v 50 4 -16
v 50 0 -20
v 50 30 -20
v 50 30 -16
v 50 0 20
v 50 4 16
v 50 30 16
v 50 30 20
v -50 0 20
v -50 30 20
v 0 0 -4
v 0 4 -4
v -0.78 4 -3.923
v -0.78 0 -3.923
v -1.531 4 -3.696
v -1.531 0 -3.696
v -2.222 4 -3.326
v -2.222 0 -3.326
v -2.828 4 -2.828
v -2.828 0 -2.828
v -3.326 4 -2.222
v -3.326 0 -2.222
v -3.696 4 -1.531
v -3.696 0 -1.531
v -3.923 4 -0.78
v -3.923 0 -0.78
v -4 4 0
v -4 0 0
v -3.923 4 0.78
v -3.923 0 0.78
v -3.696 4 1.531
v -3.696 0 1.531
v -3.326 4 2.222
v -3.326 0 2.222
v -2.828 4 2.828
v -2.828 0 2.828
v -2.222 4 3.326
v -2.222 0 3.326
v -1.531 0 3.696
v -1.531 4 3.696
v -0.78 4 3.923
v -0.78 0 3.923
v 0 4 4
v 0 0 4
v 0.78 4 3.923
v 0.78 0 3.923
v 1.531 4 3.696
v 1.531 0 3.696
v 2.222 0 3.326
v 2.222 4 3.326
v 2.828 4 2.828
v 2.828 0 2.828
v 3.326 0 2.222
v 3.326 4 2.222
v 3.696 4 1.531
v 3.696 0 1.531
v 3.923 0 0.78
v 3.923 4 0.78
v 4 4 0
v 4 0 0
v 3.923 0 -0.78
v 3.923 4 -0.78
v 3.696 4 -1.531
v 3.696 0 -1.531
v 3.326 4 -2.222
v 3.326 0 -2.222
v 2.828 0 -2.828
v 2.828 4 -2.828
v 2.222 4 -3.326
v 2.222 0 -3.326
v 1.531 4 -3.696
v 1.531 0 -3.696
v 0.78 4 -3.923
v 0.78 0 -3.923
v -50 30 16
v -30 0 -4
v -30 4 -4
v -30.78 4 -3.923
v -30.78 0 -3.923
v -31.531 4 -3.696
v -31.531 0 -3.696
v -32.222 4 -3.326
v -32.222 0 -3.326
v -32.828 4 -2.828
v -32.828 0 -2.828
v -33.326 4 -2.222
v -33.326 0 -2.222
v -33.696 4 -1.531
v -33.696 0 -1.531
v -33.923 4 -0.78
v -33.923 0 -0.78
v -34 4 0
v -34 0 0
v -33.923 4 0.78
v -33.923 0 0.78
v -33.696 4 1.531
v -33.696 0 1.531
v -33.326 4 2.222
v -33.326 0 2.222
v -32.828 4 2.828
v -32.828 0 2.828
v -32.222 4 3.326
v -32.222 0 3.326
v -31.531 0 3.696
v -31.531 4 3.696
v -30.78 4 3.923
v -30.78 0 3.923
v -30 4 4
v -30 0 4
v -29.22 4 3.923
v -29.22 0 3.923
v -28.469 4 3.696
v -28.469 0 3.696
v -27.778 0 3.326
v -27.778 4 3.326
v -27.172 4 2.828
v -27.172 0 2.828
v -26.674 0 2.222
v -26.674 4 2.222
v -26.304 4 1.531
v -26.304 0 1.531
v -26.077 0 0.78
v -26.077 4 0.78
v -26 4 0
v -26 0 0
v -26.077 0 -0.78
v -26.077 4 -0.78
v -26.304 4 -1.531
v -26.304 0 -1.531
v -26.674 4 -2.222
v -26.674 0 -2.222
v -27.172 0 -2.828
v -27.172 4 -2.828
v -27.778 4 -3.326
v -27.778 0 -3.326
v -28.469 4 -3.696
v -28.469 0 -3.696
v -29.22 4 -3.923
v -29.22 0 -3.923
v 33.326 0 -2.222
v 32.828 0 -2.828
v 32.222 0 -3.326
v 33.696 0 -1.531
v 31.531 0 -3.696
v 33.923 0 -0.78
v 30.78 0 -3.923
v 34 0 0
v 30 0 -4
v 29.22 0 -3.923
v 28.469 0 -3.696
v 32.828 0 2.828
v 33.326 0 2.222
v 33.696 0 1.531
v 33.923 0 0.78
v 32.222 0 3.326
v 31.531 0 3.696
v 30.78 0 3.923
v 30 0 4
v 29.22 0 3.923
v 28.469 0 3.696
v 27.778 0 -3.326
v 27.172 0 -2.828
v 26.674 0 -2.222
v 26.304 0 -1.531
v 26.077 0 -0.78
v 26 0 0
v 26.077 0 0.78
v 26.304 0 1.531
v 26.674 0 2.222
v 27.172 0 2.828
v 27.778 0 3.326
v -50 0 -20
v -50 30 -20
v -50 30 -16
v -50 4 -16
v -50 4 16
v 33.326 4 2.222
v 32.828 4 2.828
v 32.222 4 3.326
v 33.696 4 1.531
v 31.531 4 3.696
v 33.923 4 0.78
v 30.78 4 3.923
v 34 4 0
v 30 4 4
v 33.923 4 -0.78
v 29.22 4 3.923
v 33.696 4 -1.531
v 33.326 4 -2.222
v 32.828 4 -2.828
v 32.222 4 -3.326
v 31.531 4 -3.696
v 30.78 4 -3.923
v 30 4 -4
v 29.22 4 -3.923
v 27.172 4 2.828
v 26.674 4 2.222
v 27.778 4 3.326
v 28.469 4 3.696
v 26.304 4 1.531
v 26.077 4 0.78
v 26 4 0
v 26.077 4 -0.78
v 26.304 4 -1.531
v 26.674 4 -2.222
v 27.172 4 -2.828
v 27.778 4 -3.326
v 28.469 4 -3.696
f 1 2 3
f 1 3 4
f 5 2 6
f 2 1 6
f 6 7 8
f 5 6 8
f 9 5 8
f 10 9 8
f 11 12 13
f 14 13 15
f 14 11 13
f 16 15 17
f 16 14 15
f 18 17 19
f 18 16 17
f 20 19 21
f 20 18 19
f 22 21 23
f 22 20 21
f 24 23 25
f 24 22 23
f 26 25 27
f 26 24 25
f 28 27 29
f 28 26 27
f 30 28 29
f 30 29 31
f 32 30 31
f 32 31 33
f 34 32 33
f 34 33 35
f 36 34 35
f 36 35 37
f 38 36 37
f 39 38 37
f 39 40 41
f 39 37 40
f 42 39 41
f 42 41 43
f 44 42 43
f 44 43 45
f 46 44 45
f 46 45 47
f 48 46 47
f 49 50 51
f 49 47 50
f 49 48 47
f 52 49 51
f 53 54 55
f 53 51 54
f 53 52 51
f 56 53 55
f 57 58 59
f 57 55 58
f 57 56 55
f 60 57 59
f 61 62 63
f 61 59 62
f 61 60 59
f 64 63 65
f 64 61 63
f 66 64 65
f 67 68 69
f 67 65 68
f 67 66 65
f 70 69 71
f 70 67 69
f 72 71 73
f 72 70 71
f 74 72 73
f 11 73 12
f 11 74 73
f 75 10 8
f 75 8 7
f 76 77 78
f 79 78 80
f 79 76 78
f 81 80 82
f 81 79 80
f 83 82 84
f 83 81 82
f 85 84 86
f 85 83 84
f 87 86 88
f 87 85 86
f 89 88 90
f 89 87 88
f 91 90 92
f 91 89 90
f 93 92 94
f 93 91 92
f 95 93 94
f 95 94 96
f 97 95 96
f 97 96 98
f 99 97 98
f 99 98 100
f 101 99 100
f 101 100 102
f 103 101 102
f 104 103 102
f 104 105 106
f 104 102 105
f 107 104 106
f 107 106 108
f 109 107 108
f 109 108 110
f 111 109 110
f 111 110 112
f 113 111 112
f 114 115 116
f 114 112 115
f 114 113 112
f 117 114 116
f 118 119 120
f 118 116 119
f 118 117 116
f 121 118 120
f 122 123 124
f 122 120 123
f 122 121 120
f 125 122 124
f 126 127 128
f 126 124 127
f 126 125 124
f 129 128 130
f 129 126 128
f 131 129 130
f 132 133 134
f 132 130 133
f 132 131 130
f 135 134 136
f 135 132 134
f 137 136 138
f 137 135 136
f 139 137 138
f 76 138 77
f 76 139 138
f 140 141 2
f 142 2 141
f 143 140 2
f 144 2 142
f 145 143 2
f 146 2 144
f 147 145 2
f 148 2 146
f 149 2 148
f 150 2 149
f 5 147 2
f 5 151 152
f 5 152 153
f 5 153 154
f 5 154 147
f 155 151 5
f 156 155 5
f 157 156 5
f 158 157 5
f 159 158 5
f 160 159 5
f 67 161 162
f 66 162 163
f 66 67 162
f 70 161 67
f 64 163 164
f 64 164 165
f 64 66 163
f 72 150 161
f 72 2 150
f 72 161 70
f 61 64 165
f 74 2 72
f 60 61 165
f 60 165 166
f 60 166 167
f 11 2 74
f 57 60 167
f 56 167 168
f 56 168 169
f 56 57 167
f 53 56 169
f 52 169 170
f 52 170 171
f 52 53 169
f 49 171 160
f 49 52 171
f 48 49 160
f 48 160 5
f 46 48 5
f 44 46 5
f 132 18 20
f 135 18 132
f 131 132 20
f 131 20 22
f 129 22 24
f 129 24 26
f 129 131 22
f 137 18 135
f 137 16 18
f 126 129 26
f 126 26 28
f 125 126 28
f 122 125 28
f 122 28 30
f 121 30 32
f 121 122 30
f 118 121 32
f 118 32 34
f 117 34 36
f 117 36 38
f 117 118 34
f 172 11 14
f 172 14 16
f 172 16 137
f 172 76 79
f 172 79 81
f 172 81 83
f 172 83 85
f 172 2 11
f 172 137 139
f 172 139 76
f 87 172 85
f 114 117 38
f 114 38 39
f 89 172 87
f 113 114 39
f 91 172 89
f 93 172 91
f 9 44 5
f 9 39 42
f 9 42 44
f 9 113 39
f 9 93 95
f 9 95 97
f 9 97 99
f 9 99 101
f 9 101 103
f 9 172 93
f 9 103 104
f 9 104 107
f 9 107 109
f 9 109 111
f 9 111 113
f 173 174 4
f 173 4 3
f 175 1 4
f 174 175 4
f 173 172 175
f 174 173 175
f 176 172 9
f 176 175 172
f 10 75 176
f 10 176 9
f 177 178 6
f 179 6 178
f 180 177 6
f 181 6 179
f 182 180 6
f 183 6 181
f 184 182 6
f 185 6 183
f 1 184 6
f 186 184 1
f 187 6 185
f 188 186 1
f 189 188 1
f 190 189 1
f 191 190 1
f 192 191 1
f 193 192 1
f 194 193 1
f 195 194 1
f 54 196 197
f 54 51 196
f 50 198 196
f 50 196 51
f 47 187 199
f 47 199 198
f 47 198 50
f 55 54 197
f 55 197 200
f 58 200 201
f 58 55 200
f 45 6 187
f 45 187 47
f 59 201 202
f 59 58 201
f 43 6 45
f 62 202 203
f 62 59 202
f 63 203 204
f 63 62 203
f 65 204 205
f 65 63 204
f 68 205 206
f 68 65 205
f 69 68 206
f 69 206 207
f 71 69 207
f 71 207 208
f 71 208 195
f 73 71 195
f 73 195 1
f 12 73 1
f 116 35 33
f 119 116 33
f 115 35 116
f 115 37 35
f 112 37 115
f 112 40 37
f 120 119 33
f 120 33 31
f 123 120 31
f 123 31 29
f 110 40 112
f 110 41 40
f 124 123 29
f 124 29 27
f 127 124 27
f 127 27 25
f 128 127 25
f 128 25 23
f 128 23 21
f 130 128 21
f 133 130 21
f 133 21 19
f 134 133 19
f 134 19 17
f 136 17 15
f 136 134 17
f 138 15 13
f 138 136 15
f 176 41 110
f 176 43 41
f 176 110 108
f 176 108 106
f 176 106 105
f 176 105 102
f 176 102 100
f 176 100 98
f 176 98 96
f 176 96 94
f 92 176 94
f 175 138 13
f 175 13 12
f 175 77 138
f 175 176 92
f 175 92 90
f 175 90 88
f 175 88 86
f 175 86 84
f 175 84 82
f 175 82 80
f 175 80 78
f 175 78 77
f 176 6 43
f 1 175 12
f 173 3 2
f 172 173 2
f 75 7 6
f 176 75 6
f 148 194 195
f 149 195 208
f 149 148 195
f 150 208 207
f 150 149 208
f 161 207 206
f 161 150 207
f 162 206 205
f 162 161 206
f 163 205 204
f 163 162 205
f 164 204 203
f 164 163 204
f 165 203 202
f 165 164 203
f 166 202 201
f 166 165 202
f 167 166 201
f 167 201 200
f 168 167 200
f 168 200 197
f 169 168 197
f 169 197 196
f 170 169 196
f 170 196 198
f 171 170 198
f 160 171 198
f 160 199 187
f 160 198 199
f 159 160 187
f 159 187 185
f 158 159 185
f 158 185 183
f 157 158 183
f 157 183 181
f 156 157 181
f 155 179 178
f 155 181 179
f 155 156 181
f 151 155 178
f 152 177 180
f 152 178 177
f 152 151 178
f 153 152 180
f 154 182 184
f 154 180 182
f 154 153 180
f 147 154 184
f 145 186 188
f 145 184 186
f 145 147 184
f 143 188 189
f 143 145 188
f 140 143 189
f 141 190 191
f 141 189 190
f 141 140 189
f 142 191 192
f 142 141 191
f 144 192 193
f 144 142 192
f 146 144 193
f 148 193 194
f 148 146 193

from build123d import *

# Parameters (mm, degrees)
EXTRUDE_1_DEPTH     = 100
SKETCH_2_R          = 4
CUT_EXTRUDE_1_DEPTH = 62.64414003


with BuildPart() as part:
    # 草图1 → 凸台-拉伸1 (new body)
    with BuildSketch(Plane(origin=(-50, 0, 0), x_dir=(0, 0, -1), z_dir=(1, 0, 0))):
        Polygon((20, 0), (-20, 0), (-20, 30), (-16, 30), (-16, 4), (16, 4), (16, 30), (20, 30), align=None)
    extrude(amount=EXTRUDE_1_DEPTH)

    # 草图2 → 切除-拉伸1 (cut, through all)
    with BuildSketch(Plane(origin=(0, 0, 0), x_dir=(1, 0, 0), z_dir=(0, 1, 0))):
        with Locations(Location((-30, 0, 0), (0, 0, 90))):
            Circle(SKETCH_2_R)
        with Locations(Location((0, 0, 0), (0, 0, 90))):
            Circle(SKETCH_2_R)
        with Locations(Location((30, 0, 0), (0, 0, 90))):
            Circle(SKETCH_2_R)
    extrude(amount=CUT_EXTRUDE_1_DEPTH, mode=Mode.SUBTRACT)


solid = part.part
